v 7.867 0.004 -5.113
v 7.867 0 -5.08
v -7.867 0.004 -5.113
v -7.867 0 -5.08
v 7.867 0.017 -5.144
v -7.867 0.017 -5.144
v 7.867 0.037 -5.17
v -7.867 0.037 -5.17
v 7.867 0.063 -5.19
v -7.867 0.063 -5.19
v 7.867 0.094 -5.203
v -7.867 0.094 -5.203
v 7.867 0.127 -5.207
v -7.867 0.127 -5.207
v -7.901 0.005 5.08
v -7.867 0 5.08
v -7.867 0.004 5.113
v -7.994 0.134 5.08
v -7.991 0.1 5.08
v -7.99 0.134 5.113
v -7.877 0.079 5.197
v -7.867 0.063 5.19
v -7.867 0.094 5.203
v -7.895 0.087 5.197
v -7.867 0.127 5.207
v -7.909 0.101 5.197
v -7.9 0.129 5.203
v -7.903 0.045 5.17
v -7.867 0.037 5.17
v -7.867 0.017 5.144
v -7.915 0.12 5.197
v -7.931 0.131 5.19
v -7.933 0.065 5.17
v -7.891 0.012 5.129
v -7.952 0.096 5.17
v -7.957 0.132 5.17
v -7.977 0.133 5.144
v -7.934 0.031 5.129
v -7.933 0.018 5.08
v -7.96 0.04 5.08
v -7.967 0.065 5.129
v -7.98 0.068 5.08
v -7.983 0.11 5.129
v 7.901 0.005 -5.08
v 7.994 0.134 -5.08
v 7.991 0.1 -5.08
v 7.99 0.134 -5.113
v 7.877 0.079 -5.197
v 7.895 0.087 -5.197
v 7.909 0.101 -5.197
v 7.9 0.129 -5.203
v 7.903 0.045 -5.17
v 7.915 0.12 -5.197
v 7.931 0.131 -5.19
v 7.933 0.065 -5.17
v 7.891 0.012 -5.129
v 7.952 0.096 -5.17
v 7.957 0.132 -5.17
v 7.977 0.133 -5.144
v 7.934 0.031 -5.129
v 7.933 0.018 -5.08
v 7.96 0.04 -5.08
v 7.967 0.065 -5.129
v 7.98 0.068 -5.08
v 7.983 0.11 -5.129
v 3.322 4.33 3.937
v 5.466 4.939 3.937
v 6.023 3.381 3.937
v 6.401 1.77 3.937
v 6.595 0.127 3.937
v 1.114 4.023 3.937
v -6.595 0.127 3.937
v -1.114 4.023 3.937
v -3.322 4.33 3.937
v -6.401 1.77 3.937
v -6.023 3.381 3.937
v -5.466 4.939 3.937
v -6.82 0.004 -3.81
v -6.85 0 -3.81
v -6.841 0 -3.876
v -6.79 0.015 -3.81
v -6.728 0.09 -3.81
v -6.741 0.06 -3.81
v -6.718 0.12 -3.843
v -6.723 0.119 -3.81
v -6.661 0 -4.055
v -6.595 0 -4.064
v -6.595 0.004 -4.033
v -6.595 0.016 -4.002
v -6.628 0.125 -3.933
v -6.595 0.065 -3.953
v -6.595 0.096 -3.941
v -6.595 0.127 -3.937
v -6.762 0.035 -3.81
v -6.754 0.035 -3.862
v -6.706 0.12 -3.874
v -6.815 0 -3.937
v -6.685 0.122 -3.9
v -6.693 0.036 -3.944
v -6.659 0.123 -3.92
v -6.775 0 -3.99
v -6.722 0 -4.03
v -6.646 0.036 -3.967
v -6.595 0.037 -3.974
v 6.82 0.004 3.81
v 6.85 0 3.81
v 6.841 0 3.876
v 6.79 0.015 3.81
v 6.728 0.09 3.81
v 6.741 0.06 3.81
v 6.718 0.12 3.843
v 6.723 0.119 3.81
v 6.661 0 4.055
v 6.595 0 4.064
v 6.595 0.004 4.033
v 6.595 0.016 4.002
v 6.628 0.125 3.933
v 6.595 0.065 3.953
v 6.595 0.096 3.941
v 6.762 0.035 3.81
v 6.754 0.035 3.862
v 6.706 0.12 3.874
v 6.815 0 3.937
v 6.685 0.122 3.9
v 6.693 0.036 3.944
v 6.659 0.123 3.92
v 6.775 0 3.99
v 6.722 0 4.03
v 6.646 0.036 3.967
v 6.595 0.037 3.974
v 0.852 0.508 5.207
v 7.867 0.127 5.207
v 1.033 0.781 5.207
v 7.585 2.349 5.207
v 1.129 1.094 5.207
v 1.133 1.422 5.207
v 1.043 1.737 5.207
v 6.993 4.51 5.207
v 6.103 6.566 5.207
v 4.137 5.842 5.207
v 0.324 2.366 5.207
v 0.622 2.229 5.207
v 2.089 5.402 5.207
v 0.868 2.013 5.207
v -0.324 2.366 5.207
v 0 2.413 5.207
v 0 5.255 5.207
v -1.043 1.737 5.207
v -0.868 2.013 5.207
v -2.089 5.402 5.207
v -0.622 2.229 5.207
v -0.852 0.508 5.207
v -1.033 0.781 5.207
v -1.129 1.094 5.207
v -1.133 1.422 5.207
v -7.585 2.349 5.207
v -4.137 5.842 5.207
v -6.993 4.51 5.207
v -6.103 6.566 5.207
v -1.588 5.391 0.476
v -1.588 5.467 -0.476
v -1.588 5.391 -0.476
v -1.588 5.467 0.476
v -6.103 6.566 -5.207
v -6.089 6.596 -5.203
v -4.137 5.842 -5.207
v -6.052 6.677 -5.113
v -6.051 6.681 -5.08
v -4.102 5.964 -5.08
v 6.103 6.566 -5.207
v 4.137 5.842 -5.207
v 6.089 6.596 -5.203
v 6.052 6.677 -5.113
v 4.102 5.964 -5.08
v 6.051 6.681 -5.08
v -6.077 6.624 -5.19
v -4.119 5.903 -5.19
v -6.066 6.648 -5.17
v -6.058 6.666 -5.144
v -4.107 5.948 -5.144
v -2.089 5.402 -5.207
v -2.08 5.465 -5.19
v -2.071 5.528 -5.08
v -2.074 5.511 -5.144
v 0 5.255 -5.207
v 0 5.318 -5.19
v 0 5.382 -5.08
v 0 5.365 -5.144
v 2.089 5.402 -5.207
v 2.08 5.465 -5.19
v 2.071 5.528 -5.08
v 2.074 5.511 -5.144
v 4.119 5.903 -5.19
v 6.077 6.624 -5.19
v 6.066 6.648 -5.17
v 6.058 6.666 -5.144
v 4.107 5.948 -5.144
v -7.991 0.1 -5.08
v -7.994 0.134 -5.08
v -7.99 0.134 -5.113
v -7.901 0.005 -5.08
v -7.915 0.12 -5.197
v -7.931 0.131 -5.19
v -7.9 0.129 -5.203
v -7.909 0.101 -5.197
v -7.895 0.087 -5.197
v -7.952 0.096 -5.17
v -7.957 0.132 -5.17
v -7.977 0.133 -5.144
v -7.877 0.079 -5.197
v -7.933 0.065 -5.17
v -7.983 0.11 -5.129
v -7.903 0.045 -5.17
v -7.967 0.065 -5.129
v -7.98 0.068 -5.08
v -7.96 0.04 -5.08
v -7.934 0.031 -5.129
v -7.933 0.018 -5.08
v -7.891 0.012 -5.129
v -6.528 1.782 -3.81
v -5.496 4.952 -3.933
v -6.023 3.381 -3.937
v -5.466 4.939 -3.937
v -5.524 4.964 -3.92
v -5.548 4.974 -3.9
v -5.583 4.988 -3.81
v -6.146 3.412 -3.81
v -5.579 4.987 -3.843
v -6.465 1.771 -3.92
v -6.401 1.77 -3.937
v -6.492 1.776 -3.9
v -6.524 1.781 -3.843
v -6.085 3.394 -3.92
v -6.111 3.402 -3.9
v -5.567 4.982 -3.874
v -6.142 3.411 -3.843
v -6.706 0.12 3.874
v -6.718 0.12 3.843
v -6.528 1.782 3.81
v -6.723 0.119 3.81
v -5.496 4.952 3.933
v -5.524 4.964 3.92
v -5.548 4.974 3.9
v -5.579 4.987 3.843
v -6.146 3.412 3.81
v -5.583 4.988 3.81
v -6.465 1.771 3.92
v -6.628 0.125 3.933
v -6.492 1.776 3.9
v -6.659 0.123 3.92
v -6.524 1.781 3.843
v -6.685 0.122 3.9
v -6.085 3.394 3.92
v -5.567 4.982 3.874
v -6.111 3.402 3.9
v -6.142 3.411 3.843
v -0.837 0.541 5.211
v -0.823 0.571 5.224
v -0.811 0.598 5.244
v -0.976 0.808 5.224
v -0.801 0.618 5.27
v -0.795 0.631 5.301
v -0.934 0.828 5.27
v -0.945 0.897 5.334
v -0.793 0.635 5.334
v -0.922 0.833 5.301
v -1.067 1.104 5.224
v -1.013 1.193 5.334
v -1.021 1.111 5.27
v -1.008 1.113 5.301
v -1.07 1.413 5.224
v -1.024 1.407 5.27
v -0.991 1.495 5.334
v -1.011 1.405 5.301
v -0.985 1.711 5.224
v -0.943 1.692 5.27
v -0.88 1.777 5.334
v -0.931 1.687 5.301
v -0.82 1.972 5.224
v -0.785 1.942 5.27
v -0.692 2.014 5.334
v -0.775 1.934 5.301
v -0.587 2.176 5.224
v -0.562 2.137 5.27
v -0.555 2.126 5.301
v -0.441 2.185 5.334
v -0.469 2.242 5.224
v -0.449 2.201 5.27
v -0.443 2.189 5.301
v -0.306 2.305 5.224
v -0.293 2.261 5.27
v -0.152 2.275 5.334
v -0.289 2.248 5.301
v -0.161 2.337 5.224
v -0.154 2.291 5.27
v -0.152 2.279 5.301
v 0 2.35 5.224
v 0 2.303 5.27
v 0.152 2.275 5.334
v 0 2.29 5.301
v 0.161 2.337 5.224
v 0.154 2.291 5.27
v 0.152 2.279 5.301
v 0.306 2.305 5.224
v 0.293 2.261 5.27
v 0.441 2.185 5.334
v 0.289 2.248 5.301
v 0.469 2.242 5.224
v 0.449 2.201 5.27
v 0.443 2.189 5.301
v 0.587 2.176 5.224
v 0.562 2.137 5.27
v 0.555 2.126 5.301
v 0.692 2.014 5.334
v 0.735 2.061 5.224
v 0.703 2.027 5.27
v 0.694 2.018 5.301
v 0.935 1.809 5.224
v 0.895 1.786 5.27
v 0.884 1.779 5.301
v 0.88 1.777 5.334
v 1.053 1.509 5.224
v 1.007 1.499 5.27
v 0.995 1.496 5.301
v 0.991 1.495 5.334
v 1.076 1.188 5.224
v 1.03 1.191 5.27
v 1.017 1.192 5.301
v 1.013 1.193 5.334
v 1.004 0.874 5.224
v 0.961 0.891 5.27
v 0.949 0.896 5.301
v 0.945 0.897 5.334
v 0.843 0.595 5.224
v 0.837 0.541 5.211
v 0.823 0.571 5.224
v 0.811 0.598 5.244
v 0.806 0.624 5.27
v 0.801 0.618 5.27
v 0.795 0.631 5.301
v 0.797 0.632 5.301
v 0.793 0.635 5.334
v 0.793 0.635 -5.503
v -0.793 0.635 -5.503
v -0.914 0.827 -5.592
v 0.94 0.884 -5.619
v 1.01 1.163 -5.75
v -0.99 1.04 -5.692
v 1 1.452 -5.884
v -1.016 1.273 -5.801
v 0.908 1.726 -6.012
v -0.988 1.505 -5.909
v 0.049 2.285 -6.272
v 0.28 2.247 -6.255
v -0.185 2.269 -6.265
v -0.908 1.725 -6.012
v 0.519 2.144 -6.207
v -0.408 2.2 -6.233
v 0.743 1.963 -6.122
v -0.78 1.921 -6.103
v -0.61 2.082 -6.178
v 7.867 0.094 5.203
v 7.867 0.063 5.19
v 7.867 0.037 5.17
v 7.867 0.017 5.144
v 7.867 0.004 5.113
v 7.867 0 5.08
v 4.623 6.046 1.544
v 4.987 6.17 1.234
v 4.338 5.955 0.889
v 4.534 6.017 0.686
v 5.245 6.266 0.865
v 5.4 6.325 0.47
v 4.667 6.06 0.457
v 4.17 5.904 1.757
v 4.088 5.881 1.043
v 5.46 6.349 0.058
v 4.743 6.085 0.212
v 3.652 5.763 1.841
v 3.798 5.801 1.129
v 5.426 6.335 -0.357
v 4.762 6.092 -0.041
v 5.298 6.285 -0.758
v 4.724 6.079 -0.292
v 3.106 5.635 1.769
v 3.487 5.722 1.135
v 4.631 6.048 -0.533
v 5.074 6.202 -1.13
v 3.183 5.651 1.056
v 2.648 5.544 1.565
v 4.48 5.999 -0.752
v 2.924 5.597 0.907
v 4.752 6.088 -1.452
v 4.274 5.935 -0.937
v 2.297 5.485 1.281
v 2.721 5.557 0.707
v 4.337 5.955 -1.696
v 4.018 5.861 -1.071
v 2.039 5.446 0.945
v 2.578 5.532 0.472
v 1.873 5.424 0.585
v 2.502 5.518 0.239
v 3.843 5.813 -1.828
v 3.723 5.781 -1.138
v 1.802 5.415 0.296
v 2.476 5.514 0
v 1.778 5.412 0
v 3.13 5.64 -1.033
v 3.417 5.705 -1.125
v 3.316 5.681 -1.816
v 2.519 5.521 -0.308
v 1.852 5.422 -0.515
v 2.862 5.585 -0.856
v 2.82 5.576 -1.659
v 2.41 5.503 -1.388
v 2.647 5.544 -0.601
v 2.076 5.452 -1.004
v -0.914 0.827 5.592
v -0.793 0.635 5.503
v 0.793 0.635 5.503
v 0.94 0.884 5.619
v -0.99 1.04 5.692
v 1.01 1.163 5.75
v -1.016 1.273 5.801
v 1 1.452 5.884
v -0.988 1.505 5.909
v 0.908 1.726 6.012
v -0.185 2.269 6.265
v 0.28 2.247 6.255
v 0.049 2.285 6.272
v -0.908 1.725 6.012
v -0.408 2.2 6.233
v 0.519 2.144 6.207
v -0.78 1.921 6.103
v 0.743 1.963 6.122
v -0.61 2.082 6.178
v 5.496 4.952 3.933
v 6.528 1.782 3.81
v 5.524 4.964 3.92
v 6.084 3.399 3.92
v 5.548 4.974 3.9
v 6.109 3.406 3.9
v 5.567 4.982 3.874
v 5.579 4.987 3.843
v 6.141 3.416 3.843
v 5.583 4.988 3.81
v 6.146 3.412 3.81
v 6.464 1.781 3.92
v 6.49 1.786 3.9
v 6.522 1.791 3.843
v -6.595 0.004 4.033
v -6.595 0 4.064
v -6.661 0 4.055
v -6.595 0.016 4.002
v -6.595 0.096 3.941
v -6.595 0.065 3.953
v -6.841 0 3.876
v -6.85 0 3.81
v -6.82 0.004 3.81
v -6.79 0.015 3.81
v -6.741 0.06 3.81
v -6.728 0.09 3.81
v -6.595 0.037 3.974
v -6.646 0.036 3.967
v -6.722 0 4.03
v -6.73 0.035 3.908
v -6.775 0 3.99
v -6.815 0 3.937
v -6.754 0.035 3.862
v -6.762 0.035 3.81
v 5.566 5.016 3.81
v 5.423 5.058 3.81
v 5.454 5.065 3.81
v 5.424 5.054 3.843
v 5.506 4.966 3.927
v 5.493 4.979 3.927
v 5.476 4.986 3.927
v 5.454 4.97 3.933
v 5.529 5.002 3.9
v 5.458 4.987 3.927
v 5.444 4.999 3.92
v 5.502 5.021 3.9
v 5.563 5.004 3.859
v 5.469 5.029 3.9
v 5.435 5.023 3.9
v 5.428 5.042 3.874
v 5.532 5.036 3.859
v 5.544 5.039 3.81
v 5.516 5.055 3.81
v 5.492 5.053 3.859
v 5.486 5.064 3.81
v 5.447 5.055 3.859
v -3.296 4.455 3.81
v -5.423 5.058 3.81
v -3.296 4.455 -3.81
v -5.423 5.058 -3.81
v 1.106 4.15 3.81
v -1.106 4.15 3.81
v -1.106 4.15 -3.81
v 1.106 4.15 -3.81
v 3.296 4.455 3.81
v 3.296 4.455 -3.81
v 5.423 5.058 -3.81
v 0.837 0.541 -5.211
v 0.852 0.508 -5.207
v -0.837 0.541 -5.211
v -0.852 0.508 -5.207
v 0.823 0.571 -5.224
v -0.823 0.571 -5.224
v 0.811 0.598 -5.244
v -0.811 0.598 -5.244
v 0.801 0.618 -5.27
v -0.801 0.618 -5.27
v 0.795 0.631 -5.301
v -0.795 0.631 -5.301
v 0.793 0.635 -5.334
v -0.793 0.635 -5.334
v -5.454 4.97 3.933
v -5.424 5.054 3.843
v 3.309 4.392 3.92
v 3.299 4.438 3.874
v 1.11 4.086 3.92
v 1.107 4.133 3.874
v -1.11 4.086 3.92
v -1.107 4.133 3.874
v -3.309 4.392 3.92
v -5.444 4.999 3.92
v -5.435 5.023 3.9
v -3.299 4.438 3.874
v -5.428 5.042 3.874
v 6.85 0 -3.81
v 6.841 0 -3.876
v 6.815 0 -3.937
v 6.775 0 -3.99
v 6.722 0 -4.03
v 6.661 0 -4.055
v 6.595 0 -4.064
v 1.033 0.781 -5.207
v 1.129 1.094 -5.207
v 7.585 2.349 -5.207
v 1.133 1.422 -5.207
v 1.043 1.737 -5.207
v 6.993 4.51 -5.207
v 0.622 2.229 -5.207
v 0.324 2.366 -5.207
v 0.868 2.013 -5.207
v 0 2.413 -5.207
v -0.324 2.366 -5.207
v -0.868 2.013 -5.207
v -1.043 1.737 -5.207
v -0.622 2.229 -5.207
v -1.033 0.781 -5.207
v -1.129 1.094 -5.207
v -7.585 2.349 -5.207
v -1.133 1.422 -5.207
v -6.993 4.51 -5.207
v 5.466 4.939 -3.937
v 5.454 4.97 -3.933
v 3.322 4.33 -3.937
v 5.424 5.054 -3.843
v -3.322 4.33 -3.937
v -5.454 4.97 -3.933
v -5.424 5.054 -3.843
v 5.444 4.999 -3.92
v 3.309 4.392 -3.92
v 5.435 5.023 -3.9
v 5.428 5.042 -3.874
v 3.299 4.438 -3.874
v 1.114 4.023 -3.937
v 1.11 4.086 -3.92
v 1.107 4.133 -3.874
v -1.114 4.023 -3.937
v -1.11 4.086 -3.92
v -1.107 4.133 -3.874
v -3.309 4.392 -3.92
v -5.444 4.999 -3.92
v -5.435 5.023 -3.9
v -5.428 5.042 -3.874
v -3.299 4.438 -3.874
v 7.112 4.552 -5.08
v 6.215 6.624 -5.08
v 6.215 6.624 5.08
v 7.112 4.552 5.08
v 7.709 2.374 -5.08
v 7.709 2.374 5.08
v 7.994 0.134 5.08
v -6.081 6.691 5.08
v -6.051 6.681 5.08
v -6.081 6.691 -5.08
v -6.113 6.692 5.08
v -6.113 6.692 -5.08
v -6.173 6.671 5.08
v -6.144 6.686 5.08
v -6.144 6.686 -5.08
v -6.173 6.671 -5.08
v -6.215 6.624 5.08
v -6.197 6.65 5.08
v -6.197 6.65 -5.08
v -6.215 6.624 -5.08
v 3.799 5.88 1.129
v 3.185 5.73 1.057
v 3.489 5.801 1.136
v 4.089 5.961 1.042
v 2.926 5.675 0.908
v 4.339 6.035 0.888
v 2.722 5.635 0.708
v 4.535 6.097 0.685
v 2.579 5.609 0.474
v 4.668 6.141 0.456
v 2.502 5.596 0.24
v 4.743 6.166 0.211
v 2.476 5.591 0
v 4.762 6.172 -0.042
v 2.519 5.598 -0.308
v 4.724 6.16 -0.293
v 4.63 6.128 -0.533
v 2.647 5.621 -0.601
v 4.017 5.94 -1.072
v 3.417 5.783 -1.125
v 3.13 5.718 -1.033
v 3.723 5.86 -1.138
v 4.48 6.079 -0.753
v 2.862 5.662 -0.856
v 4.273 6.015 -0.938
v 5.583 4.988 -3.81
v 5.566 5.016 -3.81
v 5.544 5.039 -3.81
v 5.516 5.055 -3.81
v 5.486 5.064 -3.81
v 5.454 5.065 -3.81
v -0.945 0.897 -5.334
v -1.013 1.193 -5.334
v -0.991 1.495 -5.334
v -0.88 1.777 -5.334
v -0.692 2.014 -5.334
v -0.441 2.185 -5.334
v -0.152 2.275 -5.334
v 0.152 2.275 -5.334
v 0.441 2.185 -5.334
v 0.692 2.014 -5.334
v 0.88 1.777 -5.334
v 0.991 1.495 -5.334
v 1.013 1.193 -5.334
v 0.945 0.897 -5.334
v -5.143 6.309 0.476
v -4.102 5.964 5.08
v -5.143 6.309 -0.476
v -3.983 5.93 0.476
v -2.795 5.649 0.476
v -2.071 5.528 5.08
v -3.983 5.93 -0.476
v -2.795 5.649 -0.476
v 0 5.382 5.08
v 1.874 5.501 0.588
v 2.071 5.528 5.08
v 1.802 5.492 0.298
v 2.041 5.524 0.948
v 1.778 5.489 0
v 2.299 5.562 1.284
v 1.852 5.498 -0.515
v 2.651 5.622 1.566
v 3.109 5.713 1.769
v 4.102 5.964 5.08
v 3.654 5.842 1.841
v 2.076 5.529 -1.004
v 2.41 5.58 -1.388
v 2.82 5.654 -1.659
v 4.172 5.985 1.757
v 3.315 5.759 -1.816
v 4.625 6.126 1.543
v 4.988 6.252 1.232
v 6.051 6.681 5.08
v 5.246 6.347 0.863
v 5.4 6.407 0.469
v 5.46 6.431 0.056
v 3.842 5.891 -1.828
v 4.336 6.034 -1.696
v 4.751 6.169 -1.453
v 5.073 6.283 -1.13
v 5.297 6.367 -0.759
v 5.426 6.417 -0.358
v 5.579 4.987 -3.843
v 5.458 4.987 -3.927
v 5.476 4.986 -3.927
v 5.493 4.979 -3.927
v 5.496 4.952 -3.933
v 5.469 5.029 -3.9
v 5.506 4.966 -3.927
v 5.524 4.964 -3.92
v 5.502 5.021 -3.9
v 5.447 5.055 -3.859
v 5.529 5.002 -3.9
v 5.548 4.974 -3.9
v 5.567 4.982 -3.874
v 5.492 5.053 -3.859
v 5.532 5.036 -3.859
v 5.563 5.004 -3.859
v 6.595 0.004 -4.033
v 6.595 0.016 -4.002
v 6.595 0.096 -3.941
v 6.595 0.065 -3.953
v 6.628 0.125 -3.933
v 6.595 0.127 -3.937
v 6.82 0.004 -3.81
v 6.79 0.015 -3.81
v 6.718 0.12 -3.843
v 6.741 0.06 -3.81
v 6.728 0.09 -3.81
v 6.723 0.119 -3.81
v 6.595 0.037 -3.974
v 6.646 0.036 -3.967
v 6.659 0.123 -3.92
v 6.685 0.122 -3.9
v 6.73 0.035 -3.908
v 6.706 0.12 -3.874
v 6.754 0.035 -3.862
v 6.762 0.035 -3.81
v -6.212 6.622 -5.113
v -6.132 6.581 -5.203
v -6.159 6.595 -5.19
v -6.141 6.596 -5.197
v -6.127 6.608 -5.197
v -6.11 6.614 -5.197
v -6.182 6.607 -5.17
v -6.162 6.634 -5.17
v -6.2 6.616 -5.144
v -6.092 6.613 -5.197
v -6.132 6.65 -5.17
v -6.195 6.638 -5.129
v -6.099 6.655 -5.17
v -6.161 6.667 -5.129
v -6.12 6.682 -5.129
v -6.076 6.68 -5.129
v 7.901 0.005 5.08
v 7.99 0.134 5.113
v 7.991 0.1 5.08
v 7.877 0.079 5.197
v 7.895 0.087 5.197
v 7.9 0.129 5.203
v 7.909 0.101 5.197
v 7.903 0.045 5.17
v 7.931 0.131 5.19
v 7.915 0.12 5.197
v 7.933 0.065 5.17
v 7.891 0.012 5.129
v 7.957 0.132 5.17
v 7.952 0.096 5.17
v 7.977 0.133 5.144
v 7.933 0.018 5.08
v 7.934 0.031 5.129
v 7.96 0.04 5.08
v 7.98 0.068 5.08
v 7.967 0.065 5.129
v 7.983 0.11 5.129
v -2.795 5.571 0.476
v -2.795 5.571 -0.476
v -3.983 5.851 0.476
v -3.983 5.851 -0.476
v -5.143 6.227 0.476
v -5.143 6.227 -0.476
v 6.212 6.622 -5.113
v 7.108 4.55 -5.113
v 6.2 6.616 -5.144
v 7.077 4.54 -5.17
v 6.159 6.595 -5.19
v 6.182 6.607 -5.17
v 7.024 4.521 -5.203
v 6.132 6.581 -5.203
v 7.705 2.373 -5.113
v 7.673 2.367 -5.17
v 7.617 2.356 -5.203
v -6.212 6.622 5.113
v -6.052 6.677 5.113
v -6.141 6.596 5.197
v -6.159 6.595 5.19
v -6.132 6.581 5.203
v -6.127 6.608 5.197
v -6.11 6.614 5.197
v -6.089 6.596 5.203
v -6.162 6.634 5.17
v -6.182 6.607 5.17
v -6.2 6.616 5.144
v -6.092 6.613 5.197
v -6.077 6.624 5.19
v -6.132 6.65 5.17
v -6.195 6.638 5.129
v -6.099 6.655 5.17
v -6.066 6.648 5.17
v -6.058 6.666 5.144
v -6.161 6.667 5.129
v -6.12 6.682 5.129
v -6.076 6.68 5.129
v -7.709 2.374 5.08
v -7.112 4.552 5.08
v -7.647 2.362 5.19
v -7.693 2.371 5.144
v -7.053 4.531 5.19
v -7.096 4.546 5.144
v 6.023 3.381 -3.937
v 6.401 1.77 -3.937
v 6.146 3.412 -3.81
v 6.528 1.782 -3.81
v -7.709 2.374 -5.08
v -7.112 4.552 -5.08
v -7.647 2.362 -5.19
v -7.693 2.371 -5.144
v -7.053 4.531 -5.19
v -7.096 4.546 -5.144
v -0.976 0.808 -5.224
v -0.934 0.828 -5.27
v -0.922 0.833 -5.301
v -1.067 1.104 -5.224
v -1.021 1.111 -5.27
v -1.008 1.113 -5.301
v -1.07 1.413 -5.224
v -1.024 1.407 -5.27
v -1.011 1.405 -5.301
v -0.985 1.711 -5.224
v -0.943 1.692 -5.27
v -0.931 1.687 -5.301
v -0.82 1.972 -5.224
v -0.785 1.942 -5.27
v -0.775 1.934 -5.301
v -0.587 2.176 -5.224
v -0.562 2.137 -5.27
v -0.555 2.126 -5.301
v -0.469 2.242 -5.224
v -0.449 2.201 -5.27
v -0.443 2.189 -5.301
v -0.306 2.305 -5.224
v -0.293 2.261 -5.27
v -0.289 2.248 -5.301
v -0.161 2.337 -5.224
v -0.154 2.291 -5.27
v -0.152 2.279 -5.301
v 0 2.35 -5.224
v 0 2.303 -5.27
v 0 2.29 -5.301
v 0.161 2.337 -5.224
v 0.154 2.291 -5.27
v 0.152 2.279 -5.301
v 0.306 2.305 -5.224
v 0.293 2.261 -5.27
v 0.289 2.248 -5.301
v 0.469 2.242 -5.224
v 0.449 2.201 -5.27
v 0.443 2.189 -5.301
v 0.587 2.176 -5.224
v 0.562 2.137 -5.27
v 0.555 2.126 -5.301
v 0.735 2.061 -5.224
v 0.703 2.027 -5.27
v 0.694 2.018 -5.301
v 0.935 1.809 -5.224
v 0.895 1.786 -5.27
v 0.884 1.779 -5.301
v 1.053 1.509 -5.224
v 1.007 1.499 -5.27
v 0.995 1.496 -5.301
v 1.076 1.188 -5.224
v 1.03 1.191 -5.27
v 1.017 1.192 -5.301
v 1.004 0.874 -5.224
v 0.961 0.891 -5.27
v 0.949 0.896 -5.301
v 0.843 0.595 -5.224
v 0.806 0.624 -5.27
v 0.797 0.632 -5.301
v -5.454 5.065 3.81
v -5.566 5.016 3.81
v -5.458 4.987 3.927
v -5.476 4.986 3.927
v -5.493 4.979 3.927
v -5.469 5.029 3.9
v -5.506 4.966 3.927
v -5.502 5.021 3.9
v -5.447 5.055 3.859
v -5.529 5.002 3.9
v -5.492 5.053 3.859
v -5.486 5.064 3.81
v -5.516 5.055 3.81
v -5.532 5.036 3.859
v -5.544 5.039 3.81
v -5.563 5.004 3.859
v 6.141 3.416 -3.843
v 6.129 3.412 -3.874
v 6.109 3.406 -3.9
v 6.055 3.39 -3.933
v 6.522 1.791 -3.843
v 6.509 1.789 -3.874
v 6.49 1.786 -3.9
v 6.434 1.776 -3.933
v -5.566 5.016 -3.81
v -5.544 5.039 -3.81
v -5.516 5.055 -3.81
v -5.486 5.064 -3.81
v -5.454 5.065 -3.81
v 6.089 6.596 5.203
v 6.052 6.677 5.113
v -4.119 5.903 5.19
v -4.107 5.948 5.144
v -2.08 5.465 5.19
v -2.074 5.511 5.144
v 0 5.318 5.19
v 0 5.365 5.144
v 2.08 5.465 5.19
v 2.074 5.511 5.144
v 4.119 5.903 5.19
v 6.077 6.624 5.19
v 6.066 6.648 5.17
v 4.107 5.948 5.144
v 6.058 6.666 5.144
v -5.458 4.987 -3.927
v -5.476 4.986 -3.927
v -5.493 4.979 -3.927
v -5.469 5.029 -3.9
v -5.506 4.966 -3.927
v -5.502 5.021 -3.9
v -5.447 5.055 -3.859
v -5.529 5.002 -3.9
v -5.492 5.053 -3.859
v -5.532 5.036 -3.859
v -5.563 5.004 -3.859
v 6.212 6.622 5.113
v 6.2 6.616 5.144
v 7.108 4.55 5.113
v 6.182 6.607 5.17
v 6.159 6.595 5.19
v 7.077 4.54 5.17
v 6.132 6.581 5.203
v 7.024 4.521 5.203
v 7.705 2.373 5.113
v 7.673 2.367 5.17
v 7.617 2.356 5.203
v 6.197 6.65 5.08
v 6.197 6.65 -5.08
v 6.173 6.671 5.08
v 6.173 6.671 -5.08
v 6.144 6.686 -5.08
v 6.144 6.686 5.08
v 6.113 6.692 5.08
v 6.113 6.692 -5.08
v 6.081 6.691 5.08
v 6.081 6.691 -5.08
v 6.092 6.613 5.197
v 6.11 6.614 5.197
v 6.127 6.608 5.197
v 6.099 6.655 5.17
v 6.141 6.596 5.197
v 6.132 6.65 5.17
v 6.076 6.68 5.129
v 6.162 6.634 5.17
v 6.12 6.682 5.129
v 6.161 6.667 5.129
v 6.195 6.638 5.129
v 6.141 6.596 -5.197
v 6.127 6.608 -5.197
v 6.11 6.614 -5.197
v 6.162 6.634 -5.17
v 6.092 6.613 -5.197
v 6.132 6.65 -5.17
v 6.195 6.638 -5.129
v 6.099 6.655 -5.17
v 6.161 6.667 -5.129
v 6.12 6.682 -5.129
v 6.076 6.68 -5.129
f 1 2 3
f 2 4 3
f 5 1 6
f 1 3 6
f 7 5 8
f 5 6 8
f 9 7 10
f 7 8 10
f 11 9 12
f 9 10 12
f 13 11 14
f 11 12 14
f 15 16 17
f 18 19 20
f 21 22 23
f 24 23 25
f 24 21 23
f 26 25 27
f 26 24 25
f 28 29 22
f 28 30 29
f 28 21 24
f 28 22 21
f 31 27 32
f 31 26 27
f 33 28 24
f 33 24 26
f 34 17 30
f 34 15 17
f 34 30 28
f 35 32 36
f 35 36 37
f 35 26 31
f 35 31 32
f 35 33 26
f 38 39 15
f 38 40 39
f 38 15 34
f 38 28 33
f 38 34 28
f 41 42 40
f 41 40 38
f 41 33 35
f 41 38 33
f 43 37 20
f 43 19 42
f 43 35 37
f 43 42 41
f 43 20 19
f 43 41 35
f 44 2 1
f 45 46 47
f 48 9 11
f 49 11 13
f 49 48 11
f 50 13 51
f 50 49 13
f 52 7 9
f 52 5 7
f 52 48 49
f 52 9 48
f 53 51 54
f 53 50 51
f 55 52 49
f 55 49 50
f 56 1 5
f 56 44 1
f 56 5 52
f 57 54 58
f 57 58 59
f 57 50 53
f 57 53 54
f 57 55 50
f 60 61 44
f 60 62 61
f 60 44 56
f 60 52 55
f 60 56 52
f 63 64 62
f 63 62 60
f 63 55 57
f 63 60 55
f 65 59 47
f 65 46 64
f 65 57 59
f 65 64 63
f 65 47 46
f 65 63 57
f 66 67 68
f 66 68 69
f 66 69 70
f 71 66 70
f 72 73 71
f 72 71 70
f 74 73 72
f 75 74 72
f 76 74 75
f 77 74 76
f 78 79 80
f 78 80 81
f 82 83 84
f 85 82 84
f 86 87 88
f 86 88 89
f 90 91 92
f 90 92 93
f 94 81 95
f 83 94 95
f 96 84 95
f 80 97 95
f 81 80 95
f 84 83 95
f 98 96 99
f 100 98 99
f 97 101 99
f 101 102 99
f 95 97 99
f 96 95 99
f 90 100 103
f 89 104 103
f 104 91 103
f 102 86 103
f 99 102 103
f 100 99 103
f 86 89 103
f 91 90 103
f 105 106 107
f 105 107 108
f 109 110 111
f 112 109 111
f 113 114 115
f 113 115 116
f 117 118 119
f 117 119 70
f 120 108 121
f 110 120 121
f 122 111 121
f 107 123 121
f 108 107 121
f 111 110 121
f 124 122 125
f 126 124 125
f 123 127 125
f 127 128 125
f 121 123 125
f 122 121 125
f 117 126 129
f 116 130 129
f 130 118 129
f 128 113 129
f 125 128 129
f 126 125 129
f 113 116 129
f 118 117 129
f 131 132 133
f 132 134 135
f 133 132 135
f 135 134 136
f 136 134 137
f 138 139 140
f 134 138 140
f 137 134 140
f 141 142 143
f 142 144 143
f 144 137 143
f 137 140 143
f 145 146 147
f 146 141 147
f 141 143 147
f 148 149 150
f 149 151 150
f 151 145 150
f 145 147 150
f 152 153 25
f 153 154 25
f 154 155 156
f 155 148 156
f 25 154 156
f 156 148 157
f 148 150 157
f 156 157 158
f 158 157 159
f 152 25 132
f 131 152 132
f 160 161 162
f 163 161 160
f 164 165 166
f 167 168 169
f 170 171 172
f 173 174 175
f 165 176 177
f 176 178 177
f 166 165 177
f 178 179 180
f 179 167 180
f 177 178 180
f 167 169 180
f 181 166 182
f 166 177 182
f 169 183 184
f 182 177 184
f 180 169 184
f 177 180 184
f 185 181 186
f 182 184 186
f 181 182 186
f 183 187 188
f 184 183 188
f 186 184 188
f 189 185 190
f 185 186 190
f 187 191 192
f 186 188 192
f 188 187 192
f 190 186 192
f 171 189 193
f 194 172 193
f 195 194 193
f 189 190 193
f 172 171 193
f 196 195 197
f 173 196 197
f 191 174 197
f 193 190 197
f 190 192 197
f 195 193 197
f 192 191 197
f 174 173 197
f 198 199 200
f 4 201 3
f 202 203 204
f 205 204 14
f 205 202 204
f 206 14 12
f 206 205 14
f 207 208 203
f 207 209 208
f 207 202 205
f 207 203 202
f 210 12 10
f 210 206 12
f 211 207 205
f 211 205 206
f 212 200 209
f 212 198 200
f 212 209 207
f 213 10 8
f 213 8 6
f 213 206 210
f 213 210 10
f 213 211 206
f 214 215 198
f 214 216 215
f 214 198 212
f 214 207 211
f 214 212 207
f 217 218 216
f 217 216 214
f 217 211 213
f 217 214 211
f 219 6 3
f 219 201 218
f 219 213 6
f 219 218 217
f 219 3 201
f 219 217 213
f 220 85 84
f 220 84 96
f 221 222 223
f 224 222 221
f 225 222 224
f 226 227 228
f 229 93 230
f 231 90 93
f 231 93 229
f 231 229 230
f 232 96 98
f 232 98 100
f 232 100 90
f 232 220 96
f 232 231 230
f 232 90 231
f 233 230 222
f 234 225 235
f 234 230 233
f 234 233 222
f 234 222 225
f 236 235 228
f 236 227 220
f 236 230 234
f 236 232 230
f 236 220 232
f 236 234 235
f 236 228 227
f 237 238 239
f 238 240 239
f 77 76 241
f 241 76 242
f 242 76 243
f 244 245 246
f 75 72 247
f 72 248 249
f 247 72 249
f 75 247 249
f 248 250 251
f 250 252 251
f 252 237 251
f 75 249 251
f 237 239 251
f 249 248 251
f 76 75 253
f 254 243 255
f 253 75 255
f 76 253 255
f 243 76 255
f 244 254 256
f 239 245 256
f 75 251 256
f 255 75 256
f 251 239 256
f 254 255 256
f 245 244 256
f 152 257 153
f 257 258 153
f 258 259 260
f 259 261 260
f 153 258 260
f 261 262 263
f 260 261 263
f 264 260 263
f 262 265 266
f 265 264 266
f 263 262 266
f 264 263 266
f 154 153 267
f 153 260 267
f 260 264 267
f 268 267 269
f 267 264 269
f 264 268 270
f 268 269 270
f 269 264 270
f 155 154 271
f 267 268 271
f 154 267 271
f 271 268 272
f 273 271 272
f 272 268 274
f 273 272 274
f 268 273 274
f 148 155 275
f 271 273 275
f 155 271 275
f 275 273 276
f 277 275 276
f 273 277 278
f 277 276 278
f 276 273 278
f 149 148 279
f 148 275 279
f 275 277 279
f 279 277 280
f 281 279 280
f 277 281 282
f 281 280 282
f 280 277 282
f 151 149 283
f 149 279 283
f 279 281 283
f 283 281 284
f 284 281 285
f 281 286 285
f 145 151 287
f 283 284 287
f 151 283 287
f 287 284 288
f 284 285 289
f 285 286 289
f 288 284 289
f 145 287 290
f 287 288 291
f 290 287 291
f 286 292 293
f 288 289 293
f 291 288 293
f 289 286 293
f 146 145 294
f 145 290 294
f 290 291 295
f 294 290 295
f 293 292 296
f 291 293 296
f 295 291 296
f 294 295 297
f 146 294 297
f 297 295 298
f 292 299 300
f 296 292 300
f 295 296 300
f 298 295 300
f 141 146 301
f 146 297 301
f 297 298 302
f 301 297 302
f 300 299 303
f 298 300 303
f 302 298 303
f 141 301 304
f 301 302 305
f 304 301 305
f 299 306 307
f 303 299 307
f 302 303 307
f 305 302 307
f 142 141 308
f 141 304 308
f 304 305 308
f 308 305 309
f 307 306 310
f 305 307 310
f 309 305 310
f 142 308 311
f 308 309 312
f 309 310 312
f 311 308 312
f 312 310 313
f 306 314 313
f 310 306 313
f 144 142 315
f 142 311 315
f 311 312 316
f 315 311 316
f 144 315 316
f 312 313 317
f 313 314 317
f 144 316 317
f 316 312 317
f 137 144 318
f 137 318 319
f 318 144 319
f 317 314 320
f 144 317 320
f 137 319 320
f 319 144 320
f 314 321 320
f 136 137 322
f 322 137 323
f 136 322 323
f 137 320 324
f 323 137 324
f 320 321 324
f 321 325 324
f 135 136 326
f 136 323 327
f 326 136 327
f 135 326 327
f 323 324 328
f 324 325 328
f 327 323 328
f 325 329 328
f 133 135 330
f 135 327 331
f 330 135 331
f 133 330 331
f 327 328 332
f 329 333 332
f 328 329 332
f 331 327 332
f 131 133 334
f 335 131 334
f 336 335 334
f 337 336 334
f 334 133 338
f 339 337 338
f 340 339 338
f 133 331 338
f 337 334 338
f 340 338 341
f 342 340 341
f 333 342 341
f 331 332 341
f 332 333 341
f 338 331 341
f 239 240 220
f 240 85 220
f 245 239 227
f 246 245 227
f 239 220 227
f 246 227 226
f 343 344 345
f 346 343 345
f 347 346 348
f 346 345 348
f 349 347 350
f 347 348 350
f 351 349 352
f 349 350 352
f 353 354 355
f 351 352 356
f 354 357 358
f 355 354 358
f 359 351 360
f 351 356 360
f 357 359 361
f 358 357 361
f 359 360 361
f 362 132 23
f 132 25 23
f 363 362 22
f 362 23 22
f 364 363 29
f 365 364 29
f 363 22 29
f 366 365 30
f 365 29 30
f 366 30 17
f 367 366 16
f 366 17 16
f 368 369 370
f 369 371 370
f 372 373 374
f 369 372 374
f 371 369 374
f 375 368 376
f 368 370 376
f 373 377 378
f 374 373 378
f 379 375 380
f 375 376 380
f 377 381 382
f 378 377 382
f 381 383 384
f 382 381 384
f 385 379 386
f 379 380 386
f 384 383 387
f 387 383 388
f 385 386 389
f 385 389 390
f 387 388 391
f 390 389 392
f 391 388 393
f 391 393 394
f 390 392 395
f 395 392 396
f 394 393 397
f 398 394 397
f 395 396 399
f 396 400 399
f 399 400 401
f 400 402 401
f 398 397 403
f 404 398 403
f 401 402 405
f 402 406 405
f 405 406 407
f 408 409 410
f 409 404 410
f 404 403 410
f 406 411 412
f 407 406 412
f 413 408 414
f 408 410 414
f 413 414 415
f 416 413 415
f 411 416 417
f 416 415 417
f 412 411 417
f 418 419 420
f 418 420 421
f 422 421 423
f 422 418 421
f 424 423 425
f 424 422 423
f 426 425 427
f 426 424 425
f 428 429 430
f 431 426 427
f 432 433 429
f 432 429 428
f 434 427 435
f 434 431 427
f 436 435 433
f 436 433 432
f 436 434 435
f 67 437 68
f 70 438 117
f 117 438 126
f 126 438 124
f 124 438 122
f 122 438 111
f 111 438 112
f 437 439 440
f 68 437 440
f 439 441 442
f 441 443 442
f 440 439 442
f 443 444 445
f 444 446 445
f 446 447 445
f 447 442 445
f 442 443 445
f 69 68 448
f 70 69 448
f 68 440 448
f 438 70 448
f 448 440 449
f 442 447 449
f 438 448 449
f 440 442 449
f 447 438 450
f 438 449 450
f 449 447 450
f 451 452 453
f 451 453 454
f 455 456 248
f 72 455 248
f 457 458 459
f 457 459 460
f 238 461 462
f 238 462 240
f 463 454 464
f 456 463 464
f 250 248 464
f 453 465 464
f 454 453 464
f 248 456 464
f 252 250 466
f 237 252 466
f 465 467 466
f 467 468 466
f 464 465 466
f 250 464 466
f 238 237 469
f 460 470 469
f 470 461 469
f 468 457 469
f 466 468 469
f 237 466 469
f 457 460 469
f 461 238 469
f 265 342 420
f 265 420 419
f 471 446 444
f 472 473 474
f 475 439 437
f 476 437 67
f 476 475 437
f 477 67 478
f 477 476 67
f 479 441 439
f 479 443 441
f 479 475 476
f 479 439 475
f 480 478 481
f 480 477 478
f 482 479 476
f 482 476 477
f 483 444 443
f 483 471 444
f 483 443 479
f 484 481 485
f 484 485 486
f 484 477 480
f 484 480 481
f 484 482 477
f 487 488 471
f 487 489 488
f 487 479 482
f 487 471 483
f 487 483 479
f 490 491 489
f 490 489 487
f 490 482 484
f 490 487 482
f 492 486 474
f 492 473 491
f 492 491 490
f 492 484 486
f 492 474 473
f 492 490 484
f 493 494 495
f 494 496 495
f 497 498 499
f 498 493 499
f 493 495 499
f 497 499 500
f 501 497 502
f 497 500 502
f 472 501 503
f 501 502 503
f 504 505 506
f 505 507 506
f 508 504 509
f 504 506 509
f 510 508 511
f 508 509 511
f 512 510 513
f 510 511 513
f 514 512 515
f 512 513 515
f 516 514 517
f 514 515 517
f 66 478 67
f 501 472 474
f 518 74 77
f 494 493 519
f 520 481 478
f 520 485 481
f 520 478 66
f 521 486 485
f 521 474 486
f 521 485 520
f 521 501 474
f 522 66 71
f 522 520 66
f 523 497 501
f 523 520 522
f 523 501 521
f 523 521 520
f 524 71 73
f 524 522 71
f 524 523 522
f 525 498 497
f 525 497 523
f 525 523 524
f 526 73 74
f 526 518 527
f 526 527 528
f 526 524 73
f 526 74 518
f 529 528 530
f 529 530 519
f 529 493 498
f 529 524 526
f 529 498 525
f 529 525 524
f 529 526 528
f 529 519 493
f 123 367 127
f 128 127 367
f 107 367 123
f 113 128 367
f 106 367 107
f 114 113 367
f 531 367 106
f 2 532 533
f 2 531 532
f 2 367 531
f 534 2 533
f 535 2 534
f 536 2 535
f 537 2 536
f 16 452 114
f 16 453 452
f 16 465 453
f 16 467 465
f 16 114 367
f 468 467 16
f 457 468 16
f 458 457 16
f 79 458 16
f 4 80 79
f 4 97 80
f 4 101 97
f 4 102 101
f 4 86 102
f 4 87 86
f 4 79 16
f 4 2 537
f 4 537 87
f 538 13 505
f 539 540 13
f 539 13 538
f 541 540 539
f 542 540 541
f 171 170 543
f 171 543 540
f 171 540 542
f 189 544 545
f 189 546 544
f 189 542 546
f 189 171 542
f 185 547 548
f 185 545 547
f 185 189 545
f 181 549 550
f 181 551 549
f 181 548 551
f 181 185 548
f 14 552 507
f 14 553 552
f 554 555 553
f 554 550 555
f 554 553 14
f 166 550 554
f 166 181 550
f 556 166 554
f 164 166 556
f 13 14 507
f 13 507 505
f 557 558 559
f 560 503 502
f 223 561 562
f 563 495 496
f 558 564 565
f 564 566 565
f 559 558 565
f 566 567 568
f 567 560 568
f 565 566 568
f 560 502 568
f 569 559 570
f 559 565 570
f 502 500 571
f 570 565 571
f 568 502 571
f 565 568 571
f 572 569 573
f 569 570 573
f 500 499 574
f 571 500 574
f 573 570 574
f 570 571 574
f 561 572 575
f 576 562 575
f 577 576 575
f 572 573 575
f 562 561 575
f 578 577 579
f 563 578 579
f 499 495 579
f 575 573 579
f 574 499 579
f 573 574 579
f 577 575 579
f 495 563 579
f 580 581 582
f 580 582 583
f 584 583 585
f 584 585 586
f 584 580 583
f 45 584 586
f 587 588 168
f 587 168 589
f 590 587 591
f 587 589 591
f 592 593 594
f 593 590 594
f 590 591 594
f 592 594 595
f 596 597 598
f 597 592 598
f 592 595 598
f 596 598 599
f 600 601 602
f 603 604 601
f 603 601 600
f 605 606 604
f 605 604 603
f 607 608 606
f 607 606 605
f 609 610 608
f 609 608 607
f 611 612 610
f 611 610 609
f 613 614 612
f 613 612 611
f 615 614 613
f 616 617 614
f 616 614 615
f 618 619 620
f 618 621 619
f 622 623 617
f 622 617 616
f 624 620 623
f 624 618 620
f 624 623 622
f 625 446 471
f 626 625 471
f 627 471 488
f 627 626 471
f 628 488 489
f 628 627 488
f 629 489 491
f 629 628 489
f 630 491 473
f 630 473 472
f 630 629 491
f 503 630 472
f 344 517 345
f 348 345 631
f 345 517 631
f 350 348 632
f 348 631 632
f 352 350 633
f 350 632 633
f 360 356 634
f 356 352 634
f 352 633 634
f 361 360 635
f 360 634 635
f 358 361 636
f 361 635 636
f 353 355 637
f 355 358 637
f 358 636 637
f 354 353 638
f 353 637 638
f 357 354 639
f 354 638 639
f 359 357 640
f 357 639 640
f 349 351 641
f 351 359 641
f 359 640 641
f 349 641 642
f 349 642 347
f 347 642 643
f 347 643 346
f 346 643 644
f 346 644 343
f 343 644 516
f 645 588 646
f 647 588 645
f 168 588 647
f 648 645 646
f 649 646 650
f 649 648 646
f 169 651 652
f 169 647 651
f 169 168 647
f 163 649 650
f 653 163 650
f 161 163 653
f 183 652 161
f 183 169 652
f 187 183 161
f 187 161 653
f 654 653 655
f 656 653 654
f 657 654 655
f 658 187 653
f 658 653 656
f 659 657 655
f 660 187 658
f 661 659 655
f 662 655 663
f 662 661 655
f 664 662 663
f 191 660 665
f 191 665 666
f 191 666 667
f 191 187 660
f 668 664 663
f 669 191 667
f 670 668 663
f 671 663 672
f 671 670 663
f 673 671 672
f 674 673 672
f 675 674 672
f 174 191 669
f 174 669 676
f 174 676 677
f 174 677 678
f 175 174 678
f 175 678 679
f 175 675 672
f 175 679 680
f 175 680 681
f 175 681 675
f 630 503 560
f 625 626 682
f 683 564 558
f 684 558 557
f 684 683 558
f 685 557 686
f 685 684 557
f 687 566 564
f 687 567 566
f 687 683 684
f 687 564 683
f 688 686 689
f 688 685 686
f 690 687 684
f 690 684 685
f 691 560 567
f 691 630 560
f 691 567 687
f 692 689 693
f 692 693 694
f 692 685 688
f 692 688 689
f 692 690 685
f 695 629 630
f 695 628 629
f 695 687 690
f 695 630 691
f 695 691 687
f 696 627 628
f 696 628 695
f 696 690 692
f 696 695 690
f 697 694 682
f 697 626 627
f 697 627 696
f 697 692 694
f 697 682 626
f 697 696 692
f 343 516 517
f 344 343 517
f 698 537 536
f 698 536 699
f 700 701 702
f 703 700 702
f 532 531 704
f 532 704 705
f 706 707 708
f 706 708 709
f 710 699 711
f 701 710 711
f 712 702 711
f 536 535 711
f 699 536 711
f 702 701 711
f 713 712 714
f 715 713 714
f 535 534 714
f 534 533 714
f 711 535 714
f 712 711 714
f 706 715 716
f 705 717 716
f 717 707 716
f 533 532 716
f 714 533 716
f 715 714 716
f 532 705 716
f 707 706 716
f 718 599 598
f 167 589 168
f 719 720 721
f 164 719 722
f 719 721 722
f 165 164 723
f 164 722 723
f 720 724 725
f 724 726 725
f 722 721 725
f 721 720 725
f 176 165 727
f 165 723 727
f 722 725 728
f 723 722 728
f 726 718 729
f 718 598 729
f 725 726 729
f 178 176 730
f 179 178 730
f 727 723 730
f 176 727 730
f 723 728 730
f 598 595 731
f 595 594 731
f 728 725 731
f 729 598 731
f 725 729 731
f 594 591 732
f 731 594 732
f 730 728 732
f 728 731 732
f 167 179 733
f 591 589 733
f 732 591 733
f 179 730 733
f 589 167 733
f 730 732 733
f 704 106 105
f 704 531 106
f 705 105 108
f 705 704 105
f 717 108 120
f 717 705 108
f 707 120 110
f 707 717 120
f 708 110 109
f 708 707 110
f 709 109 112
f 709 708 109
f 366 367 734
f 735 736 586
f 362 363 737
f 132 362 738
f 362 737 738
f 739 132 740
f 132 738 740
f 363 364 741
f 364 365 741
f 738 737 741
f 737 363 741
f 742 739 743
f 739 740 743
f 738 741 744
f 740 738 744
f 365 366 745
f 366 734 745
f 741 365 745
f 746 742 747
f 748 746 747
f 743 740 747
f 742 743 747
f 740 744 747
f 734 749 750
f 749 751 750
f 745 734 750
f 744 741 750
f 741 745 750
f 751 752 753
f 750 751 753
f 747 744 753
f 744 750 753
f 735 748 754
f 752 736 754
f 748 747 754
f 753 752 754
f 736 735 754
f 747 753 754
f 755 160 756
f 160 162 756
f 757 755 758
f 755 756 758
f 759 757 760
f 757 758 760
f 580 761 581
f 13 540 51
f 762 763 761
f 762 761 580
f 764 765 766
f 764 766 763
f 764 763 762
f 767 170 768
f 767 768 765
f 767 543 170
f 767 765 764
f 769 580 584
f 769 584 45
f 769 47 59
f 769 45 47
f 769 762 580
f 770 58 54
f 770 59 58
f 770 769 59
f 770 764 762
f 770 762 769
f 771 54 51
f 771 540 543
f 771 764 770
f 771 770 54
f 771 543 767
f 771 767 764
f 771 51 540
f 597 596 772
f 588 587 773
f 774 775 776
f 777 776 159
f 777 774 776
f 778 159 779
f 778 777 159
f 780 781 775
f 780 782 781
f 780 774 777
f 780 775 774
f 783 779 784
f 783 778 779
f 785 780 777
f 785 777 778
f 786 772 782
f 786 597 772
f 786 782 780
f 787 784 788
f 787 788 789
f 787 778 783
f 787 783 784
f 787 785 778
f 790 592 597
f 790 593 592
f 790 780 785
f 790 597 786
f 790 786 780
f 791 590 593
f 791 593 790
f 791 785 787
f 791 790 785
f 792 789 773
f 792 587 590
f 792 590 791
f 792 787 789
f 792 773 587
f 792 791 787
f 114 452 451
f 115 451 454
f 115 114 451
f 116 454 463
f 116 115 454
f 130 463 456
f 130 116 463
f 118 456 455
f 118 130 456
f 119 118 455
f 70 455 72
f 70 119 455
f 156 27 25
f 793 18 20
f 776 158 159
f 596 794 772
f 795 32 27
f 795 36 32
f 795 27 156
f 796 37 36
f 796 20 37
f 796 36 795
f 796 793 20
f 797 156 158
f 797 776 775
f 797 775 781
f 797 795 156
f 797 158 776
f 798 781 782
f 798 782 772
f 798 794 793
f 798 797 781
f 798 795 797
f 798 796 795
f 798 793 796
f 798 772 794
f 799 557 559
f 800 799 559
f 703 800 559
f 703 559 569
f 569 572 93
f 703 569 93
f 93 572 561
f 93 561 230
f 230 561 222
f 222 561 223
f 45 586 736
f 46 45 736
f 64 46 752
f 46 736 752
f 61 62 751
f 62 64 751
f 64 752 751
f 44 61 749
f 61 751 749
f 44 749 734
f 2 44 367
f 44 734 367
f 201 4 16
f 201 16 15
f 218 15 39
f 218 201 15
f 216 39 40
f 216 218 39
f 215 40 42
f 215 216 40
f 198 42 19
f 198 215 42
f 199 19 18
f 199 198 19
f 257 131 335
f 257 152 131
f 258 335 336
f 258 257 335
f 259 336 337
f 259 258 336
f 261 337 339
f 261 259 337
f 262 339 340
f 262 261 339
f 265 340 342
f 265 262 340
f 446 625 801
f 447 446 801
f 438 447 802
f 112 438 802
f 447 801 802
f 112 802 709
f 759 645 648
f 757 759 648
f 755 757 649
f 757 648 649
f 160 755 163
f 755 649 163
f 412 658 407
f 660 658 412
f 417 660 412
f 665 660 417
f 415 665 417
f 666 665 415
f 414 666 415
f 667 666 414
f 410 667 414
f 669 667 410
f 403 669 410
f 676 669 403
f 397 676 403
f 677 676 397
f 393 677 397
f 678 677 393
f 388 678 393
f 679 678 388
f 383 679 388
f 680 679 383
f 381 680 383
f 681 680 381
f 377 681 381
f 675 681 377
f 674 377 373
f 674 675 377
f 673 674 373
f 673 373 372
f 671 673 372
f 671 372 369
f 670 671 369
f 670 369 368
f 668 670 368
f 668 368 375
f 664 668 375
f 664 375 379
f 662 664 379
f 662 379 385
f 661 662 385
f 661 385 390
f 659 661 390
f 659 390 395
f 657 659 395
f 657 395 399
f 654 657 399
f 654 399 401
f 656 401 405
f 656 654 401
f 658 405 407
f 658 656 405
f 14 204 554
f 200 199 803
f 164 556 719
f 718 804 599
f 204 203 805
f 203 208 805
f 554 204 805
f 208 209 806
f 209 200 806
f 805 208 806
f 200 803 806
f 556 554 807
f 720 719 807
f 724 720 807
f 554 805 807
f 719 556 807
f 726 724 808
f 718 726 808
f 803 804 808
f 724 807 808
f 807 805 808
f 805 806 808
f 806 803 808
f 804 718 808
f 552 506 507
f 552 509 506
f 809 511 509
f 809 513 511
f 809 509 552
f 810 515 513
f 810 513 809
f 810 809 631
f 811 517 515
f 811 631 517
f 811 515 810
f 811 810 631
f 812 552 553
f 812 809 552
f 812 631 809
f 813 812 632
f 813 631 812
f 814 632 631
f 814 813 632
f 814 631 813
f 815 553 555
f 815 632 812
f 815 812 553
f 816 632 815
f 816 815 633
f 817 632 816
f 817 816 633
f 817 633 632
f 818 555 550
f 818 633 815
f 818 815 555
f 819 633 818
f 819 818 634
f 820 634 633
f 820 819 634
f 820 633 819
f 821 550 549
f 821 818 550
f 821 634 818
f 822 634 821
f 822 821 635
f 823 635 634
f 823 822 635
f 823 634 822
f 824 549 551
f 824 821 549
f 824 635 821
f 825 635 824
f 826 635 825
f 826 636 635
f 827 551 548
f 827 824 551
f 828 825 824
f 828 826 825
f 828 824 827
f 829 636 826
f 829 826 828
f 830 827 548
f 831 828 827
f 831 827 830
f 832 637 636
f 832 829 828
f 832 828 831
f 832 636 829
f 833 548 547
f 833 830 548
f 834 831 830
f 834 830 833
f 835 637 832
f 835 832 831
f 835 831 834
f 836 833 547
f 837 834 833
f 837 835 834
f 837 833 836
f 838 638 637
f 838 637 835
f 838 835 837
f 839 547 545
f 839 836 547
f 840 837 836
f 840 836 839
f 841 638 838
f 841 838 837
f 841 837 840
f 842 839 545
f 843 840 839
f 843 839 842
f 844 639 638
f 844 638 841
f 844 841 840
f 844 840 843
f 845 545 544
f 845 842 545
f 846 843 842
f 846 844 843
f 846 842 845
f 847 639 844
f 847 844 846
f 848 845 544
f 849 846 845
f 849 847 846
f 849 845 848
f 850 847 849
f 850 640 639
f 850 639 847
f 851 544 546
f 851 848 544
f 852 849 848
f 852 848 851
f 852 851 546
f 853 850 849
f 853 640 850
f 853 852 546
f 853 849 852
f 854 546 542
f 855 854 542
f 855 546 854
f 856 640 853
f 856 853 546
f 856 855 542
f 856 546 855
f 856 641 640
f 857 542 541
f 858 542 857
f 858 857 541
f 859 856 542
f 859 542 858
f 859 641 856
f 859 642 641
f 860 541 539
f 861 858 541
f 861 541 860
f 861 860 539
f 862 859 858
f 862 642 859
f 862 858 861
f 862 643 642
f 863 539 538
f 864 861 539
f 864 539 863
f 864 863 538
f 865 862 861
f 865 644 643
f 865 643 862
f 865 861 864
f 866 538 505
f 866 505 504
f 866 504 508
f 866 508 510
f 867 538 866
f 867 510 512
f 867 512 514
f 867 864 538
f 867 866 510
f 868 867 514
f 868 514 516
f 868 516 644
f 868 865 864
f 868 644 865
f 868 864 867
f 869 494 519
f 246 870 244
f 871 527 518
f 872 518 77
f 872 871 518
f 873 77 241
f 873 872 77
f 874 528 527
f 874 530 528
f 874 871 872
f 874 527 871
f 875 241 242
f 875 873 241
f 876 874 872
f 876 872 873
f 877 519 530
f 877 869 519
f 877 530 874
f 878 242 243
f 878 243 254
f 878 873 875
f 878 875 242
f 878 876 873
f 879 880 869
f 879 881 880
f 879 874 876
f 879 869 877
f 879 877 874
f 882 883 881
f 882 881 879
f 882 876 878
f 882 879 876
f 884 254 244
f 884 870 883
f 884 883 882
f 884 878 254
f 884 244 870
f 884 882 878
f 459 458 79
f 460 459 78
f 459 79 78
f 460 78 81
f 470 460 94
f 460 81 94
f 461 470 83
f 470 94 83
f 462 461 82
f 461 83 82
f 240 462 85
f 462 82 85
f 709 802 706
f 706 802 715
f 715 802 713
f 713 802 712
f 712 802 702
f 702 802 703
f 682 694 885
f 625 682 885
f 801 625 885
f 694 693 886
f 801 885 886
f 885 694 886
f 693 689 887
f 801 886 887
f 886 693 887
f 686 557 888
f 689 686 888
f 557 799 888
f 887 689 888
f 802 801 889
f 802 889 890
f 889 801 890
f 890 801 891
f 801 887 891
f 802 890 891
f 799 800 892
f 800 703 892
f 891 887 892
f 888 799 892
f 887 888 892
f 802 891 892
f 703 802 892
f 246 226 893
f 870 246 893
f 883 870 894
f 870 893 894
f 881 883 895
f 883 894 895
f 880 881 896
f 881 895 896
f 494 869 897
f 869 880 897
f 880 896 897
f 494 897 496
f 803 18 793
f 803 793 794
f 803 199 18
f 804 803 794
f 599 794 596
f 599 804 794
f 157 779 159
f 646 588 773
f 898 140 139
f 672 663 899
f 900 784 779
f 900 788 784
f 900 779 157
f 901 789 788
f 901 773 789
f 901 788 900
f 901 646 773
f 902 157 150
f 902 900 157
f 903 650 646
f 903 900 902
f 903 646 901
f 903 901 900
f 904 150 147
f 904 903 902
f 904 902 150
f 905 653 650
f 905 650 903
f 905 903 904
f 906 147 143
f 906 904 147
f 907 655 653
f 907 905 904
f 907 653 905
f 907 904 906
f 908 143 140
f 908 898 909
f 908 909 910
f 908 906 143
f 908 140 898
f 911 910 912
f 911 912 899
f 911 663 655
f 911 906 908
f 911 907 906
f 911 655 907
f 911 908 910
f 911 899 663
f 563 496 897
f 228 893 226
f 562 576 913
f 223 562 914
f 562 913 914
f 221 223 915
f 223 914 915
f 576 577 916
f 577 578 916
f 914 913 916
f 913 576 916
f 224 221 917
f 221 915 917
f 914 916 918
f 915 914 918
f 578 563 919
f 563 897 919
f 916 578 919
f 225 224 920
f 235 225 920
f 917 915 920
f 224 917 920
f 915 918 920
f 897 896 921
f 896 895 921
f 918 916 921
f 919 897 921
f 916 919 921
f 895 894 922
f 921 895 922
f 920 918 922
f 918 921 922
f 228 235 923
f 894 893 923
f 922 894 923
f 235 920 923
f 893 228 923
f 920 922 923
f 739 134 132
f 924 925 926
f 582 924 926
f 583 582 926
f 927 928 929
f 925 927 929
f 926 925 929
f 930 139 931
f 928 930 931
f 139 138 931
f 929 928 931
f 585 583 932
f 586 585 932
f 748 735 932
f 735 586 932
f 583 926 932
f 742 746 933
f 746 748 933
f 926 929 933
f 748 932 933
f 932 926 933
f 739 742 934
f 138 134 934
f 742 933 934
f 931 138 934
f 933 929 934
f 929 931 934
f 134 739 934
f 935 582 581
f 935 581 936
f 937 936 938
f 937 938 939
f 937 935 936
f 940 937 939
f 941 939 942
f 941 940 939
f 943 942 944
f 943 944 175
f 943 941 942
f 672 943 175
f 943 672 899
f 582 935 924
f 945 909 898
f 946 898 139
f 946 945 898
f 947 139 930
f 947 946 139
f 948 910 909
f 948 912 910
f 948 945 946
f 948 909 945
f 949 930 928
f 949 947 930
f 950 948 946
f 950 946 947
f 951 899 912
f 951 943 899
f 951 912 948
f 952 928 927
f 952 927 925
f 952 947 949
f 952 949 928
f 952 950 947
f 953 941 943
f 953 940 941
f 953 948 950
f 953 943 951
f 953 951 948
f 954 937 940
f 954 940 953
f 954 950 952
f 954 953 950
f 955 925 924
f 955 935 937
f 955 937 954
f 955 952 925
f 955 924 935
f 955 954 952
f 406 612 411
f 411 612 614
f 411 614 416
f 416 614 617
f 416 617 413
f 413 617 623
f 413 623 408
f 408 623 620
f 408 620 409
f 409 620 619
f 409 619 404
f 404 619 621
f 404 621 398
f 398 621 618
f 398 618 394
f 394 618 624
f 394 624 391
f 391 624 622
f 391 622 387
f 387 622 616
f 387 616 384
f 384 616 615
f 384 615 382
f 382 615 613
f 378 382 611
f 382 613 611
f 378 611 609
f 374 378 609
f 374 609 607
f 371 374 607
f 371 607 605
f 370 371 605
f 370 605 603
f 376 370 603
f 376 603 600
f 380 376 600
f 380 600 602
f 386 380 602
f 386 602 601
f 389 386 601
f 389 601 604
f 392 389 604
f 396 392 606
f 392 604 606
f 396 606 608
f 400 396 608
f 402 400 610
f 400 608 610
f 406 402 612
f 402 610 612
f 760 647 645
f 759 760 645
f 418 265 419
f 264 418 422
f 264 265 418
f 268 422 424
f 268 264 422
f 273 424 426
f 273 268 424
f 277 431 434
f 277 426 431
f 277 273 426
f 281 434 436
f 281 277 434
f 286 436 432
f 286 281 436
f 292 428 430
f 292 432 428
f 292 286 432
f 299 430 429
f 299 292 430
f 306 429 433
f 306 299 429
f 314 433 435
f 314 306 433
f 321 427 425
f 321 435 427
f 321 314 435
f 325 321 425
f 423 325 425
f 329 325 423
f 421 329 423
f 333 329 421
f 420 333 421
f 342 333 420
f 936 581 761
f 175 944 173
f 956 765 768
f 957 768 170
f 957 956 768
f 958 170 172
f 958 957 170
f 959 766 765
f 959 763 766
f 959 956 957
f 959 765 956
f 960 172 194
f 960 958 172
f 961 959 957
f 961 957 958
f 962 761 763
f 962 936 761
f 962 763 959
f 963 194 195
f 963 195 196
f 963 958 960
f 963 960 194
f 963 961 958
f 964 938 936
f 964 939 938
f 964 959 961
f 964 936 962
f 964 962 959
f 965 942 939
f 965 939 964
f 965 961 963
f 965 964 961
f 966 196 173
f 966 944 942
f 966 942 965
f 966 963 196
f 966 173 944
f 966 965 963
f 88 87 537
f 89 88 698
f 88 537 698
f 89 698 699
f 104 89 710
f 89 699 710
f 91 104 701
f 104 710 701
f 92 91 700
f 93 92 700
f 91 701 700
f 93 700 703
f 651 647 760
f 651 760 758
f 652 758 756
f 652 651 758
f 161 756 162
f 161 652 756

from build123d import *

# Parameters (mm, degrees)
BOSS_EXTRUDE1_DEPTH     = 5.207
SHELL1_T                = -1.27
BOSS_EXTRUDE2_REACH     = 16.757
CUT_EXTRUDE1_REACH      = 39.593
CUT_EXTRUDE1_END_RADIUS = 14.8082
CUT_EXTRUDE1_START      = -25.4
SKETCH11_R              = 1.8415
SKETCH11_R_2            = 1.143
SKETCH11_W              = 3.556
SKETCH11_H              = 0.9525
FILLET1_R               = 0.127


with BuildPart() as part:
    # Sketch1 → Boss-Extrude1 (new, symmetric)
    with BuildSketch(Plane(origin=(0, 0, 0), x_dir=(-1, 0, 0), z_dir=(0, 0, -1))):
        with BuildLine():
            Line((-8.001, 0), (8.001, 0))
            ThreePointArc((8.001, 0), (7.451075327, 3.466952212), (6.1595, 6.731))
            ThreePointArc((6.1595, 6.731), (0, 5.381540258), (-6.1595, 6.731))
            ThreePointArc((-6.1595, 6.731), (-7.451075327, 3.466952212), (-8.001, 0))
        make_face()
    extrude(amount=BOSS_EXTRUDE1_DEPTH, both=True)

    # Shell1
    shell1_openings = [part.faces().sort_by_distance(p)[0] for p in [
        (0, 0, 0),
    ]]
    offset(amount=SHELL1_T, openings=shell1_openings, kind=Kind.INTERSECTION)

    # Boss-Extrude2: up to this plane
    boss_extrude2_end = Plane(origin=(0, -1.994396708, 4.276997542), z_dir=(0, -0.4226182617407003, 0.9063077870366496))
    # Sketch5 → Boss-Extrude2 (add, up to the surface)
    with BuildSketch(Plane.XY.offset(5.207), mode=Mode.PRIVATE) as boss_extrude2_sk1:
        with BuildLine():
            Line((0.793114746, 0.635), (-0.793114746, 0.635))
            ThreePointArc((-0.793114746, 0.635), (0, 2.286), (0.793114746, 0.635))
        make_face()
    boss_extrude2_tool1 = split(extrude(boss_extrude2_sk1.sketch, amount=BOSS_EXTRUDE2_REACH, mode=Mode.PRIVATE), bisect_by=boss_extrude2_end, keep=Keep.BOTH, mode=Mode.PRIVATE)
    boss_extrude2 = boss_extrude2_tool1.solids().sort_by_distance((0, 1.387858, 5.207))[0]
    add(boss_extrude2)

    # Mirror2: Boss-Extrude2 across plane
    add(boss_extrude2.mirror(Plane.XY))

    # Cut-Extrude1: up to this cylinder (the profile starts inside it)
    cut_extrude1_end = Plane(origin=(0, 20.113540258, 0), z_dir=(0, 0, -1)) * Cylinder(CUT_EXTRUDE1_END_RADIUS, 109.8024, mode=Mode.PRIVATE)
    # Sketch11 → Cut-Extrude1 (cut, up to the surface)
    with BuildSketch(Plane.XZ.offset(CUT_EXTRUDE1_START), mode=Mode.PRIVATE) as cut_extrude1_sk1:
        with Locations(Location((3.6195, 0, 0), (0, 0, 180))):
            Circle(SKETCH11_R)
        with Locations(Location((3.6195, 0, 0), (0, 0, 180))):
            Circle(SKETCH11_R_2, mode=Mode.SUBTRACT)
    cut_extrude1_tool1 = extrude(cut_extrude1_sk1.sketch, amount=CUT_EXTRUDE1_REACH, mode=Mode.PRIVATE) & cut_extrude1_end
    add(cut_extrude1_tool1.solids().sort_by_distance((5.408915, 25.4, 0))[0], mode=Mode.SUBTRACT)
    # Sketch11 → Cut-Extrude1 (cut, up to the surface)
    with BuildSketch(Plane.XZ.offset(CUT_EXTRUDE1_START), mode=Mode.PRIVATE) as cut_extrude1_sk2:
        with Locations((-3.3655, 0)):
            Rectangle(SKETCH11_W, SKETCH11_H)
    cut_extrude1_tool2 = extrude(cut_extrude1_sk2.sketch, amount=CUT_EXTRUDE1_REACH, mode=Mode.PRIVATE) & cut_extrude1_end
    add(cut_extrude1_tool2.solids().sort_by_distance((-3.3655, 25.4, 0))[0], mode=Mode.SUBTRACT)

    # Fillet1
    fillet1_edges = [part.edges().sort_by_distance(p)[0] for p in [
        (0, 0, 5.207),
        (-7.451075327, 3.466952212, 5.207),
        (0, 4.111540258, 3.937),
        (5.535048759, 5.099305704, 0),
        (-6.360295192, 2.603068492, 3.937),
        (-5.535048759, 5.099305704, 0),
        (0, 0, 3.937),
        (-6.729437878, 0, 0),
        (6.360295192, 2.603068492, 3.937),
        (6.729437878, 0, 0),
        (0, 4.111540258, -3.937),
        (6.360295192, 2.603068492, -3.937),
        (0, 0, -3.937),
        (-6.360295192, 2.603068492, -3.937),
        (0, 2.286, 5.207),
        (0, 0.635, 5.207),
        (0, 2.286, -5.207),
        (0, 0.635, -5.207),
        (0, 5.381540258, 5.207),
        (-7.451075327, 3.466952212, -5.207),
        (0, 0, -5.207),
        (7.451075327, 3.466952212, -5.207),
        (0, 5.381540258, -5.207),
        (7.451075327, 3.466952212, 5.207),
        (-6.1595, 6.731, 0),
        (-8.001, 0, 0),
        (8.001, 0, 0),
        (6.1595, 6.731, 0),
    ]]
    fillet(fillet1_edges, radius=FILLET1_R)


solid = part.part
